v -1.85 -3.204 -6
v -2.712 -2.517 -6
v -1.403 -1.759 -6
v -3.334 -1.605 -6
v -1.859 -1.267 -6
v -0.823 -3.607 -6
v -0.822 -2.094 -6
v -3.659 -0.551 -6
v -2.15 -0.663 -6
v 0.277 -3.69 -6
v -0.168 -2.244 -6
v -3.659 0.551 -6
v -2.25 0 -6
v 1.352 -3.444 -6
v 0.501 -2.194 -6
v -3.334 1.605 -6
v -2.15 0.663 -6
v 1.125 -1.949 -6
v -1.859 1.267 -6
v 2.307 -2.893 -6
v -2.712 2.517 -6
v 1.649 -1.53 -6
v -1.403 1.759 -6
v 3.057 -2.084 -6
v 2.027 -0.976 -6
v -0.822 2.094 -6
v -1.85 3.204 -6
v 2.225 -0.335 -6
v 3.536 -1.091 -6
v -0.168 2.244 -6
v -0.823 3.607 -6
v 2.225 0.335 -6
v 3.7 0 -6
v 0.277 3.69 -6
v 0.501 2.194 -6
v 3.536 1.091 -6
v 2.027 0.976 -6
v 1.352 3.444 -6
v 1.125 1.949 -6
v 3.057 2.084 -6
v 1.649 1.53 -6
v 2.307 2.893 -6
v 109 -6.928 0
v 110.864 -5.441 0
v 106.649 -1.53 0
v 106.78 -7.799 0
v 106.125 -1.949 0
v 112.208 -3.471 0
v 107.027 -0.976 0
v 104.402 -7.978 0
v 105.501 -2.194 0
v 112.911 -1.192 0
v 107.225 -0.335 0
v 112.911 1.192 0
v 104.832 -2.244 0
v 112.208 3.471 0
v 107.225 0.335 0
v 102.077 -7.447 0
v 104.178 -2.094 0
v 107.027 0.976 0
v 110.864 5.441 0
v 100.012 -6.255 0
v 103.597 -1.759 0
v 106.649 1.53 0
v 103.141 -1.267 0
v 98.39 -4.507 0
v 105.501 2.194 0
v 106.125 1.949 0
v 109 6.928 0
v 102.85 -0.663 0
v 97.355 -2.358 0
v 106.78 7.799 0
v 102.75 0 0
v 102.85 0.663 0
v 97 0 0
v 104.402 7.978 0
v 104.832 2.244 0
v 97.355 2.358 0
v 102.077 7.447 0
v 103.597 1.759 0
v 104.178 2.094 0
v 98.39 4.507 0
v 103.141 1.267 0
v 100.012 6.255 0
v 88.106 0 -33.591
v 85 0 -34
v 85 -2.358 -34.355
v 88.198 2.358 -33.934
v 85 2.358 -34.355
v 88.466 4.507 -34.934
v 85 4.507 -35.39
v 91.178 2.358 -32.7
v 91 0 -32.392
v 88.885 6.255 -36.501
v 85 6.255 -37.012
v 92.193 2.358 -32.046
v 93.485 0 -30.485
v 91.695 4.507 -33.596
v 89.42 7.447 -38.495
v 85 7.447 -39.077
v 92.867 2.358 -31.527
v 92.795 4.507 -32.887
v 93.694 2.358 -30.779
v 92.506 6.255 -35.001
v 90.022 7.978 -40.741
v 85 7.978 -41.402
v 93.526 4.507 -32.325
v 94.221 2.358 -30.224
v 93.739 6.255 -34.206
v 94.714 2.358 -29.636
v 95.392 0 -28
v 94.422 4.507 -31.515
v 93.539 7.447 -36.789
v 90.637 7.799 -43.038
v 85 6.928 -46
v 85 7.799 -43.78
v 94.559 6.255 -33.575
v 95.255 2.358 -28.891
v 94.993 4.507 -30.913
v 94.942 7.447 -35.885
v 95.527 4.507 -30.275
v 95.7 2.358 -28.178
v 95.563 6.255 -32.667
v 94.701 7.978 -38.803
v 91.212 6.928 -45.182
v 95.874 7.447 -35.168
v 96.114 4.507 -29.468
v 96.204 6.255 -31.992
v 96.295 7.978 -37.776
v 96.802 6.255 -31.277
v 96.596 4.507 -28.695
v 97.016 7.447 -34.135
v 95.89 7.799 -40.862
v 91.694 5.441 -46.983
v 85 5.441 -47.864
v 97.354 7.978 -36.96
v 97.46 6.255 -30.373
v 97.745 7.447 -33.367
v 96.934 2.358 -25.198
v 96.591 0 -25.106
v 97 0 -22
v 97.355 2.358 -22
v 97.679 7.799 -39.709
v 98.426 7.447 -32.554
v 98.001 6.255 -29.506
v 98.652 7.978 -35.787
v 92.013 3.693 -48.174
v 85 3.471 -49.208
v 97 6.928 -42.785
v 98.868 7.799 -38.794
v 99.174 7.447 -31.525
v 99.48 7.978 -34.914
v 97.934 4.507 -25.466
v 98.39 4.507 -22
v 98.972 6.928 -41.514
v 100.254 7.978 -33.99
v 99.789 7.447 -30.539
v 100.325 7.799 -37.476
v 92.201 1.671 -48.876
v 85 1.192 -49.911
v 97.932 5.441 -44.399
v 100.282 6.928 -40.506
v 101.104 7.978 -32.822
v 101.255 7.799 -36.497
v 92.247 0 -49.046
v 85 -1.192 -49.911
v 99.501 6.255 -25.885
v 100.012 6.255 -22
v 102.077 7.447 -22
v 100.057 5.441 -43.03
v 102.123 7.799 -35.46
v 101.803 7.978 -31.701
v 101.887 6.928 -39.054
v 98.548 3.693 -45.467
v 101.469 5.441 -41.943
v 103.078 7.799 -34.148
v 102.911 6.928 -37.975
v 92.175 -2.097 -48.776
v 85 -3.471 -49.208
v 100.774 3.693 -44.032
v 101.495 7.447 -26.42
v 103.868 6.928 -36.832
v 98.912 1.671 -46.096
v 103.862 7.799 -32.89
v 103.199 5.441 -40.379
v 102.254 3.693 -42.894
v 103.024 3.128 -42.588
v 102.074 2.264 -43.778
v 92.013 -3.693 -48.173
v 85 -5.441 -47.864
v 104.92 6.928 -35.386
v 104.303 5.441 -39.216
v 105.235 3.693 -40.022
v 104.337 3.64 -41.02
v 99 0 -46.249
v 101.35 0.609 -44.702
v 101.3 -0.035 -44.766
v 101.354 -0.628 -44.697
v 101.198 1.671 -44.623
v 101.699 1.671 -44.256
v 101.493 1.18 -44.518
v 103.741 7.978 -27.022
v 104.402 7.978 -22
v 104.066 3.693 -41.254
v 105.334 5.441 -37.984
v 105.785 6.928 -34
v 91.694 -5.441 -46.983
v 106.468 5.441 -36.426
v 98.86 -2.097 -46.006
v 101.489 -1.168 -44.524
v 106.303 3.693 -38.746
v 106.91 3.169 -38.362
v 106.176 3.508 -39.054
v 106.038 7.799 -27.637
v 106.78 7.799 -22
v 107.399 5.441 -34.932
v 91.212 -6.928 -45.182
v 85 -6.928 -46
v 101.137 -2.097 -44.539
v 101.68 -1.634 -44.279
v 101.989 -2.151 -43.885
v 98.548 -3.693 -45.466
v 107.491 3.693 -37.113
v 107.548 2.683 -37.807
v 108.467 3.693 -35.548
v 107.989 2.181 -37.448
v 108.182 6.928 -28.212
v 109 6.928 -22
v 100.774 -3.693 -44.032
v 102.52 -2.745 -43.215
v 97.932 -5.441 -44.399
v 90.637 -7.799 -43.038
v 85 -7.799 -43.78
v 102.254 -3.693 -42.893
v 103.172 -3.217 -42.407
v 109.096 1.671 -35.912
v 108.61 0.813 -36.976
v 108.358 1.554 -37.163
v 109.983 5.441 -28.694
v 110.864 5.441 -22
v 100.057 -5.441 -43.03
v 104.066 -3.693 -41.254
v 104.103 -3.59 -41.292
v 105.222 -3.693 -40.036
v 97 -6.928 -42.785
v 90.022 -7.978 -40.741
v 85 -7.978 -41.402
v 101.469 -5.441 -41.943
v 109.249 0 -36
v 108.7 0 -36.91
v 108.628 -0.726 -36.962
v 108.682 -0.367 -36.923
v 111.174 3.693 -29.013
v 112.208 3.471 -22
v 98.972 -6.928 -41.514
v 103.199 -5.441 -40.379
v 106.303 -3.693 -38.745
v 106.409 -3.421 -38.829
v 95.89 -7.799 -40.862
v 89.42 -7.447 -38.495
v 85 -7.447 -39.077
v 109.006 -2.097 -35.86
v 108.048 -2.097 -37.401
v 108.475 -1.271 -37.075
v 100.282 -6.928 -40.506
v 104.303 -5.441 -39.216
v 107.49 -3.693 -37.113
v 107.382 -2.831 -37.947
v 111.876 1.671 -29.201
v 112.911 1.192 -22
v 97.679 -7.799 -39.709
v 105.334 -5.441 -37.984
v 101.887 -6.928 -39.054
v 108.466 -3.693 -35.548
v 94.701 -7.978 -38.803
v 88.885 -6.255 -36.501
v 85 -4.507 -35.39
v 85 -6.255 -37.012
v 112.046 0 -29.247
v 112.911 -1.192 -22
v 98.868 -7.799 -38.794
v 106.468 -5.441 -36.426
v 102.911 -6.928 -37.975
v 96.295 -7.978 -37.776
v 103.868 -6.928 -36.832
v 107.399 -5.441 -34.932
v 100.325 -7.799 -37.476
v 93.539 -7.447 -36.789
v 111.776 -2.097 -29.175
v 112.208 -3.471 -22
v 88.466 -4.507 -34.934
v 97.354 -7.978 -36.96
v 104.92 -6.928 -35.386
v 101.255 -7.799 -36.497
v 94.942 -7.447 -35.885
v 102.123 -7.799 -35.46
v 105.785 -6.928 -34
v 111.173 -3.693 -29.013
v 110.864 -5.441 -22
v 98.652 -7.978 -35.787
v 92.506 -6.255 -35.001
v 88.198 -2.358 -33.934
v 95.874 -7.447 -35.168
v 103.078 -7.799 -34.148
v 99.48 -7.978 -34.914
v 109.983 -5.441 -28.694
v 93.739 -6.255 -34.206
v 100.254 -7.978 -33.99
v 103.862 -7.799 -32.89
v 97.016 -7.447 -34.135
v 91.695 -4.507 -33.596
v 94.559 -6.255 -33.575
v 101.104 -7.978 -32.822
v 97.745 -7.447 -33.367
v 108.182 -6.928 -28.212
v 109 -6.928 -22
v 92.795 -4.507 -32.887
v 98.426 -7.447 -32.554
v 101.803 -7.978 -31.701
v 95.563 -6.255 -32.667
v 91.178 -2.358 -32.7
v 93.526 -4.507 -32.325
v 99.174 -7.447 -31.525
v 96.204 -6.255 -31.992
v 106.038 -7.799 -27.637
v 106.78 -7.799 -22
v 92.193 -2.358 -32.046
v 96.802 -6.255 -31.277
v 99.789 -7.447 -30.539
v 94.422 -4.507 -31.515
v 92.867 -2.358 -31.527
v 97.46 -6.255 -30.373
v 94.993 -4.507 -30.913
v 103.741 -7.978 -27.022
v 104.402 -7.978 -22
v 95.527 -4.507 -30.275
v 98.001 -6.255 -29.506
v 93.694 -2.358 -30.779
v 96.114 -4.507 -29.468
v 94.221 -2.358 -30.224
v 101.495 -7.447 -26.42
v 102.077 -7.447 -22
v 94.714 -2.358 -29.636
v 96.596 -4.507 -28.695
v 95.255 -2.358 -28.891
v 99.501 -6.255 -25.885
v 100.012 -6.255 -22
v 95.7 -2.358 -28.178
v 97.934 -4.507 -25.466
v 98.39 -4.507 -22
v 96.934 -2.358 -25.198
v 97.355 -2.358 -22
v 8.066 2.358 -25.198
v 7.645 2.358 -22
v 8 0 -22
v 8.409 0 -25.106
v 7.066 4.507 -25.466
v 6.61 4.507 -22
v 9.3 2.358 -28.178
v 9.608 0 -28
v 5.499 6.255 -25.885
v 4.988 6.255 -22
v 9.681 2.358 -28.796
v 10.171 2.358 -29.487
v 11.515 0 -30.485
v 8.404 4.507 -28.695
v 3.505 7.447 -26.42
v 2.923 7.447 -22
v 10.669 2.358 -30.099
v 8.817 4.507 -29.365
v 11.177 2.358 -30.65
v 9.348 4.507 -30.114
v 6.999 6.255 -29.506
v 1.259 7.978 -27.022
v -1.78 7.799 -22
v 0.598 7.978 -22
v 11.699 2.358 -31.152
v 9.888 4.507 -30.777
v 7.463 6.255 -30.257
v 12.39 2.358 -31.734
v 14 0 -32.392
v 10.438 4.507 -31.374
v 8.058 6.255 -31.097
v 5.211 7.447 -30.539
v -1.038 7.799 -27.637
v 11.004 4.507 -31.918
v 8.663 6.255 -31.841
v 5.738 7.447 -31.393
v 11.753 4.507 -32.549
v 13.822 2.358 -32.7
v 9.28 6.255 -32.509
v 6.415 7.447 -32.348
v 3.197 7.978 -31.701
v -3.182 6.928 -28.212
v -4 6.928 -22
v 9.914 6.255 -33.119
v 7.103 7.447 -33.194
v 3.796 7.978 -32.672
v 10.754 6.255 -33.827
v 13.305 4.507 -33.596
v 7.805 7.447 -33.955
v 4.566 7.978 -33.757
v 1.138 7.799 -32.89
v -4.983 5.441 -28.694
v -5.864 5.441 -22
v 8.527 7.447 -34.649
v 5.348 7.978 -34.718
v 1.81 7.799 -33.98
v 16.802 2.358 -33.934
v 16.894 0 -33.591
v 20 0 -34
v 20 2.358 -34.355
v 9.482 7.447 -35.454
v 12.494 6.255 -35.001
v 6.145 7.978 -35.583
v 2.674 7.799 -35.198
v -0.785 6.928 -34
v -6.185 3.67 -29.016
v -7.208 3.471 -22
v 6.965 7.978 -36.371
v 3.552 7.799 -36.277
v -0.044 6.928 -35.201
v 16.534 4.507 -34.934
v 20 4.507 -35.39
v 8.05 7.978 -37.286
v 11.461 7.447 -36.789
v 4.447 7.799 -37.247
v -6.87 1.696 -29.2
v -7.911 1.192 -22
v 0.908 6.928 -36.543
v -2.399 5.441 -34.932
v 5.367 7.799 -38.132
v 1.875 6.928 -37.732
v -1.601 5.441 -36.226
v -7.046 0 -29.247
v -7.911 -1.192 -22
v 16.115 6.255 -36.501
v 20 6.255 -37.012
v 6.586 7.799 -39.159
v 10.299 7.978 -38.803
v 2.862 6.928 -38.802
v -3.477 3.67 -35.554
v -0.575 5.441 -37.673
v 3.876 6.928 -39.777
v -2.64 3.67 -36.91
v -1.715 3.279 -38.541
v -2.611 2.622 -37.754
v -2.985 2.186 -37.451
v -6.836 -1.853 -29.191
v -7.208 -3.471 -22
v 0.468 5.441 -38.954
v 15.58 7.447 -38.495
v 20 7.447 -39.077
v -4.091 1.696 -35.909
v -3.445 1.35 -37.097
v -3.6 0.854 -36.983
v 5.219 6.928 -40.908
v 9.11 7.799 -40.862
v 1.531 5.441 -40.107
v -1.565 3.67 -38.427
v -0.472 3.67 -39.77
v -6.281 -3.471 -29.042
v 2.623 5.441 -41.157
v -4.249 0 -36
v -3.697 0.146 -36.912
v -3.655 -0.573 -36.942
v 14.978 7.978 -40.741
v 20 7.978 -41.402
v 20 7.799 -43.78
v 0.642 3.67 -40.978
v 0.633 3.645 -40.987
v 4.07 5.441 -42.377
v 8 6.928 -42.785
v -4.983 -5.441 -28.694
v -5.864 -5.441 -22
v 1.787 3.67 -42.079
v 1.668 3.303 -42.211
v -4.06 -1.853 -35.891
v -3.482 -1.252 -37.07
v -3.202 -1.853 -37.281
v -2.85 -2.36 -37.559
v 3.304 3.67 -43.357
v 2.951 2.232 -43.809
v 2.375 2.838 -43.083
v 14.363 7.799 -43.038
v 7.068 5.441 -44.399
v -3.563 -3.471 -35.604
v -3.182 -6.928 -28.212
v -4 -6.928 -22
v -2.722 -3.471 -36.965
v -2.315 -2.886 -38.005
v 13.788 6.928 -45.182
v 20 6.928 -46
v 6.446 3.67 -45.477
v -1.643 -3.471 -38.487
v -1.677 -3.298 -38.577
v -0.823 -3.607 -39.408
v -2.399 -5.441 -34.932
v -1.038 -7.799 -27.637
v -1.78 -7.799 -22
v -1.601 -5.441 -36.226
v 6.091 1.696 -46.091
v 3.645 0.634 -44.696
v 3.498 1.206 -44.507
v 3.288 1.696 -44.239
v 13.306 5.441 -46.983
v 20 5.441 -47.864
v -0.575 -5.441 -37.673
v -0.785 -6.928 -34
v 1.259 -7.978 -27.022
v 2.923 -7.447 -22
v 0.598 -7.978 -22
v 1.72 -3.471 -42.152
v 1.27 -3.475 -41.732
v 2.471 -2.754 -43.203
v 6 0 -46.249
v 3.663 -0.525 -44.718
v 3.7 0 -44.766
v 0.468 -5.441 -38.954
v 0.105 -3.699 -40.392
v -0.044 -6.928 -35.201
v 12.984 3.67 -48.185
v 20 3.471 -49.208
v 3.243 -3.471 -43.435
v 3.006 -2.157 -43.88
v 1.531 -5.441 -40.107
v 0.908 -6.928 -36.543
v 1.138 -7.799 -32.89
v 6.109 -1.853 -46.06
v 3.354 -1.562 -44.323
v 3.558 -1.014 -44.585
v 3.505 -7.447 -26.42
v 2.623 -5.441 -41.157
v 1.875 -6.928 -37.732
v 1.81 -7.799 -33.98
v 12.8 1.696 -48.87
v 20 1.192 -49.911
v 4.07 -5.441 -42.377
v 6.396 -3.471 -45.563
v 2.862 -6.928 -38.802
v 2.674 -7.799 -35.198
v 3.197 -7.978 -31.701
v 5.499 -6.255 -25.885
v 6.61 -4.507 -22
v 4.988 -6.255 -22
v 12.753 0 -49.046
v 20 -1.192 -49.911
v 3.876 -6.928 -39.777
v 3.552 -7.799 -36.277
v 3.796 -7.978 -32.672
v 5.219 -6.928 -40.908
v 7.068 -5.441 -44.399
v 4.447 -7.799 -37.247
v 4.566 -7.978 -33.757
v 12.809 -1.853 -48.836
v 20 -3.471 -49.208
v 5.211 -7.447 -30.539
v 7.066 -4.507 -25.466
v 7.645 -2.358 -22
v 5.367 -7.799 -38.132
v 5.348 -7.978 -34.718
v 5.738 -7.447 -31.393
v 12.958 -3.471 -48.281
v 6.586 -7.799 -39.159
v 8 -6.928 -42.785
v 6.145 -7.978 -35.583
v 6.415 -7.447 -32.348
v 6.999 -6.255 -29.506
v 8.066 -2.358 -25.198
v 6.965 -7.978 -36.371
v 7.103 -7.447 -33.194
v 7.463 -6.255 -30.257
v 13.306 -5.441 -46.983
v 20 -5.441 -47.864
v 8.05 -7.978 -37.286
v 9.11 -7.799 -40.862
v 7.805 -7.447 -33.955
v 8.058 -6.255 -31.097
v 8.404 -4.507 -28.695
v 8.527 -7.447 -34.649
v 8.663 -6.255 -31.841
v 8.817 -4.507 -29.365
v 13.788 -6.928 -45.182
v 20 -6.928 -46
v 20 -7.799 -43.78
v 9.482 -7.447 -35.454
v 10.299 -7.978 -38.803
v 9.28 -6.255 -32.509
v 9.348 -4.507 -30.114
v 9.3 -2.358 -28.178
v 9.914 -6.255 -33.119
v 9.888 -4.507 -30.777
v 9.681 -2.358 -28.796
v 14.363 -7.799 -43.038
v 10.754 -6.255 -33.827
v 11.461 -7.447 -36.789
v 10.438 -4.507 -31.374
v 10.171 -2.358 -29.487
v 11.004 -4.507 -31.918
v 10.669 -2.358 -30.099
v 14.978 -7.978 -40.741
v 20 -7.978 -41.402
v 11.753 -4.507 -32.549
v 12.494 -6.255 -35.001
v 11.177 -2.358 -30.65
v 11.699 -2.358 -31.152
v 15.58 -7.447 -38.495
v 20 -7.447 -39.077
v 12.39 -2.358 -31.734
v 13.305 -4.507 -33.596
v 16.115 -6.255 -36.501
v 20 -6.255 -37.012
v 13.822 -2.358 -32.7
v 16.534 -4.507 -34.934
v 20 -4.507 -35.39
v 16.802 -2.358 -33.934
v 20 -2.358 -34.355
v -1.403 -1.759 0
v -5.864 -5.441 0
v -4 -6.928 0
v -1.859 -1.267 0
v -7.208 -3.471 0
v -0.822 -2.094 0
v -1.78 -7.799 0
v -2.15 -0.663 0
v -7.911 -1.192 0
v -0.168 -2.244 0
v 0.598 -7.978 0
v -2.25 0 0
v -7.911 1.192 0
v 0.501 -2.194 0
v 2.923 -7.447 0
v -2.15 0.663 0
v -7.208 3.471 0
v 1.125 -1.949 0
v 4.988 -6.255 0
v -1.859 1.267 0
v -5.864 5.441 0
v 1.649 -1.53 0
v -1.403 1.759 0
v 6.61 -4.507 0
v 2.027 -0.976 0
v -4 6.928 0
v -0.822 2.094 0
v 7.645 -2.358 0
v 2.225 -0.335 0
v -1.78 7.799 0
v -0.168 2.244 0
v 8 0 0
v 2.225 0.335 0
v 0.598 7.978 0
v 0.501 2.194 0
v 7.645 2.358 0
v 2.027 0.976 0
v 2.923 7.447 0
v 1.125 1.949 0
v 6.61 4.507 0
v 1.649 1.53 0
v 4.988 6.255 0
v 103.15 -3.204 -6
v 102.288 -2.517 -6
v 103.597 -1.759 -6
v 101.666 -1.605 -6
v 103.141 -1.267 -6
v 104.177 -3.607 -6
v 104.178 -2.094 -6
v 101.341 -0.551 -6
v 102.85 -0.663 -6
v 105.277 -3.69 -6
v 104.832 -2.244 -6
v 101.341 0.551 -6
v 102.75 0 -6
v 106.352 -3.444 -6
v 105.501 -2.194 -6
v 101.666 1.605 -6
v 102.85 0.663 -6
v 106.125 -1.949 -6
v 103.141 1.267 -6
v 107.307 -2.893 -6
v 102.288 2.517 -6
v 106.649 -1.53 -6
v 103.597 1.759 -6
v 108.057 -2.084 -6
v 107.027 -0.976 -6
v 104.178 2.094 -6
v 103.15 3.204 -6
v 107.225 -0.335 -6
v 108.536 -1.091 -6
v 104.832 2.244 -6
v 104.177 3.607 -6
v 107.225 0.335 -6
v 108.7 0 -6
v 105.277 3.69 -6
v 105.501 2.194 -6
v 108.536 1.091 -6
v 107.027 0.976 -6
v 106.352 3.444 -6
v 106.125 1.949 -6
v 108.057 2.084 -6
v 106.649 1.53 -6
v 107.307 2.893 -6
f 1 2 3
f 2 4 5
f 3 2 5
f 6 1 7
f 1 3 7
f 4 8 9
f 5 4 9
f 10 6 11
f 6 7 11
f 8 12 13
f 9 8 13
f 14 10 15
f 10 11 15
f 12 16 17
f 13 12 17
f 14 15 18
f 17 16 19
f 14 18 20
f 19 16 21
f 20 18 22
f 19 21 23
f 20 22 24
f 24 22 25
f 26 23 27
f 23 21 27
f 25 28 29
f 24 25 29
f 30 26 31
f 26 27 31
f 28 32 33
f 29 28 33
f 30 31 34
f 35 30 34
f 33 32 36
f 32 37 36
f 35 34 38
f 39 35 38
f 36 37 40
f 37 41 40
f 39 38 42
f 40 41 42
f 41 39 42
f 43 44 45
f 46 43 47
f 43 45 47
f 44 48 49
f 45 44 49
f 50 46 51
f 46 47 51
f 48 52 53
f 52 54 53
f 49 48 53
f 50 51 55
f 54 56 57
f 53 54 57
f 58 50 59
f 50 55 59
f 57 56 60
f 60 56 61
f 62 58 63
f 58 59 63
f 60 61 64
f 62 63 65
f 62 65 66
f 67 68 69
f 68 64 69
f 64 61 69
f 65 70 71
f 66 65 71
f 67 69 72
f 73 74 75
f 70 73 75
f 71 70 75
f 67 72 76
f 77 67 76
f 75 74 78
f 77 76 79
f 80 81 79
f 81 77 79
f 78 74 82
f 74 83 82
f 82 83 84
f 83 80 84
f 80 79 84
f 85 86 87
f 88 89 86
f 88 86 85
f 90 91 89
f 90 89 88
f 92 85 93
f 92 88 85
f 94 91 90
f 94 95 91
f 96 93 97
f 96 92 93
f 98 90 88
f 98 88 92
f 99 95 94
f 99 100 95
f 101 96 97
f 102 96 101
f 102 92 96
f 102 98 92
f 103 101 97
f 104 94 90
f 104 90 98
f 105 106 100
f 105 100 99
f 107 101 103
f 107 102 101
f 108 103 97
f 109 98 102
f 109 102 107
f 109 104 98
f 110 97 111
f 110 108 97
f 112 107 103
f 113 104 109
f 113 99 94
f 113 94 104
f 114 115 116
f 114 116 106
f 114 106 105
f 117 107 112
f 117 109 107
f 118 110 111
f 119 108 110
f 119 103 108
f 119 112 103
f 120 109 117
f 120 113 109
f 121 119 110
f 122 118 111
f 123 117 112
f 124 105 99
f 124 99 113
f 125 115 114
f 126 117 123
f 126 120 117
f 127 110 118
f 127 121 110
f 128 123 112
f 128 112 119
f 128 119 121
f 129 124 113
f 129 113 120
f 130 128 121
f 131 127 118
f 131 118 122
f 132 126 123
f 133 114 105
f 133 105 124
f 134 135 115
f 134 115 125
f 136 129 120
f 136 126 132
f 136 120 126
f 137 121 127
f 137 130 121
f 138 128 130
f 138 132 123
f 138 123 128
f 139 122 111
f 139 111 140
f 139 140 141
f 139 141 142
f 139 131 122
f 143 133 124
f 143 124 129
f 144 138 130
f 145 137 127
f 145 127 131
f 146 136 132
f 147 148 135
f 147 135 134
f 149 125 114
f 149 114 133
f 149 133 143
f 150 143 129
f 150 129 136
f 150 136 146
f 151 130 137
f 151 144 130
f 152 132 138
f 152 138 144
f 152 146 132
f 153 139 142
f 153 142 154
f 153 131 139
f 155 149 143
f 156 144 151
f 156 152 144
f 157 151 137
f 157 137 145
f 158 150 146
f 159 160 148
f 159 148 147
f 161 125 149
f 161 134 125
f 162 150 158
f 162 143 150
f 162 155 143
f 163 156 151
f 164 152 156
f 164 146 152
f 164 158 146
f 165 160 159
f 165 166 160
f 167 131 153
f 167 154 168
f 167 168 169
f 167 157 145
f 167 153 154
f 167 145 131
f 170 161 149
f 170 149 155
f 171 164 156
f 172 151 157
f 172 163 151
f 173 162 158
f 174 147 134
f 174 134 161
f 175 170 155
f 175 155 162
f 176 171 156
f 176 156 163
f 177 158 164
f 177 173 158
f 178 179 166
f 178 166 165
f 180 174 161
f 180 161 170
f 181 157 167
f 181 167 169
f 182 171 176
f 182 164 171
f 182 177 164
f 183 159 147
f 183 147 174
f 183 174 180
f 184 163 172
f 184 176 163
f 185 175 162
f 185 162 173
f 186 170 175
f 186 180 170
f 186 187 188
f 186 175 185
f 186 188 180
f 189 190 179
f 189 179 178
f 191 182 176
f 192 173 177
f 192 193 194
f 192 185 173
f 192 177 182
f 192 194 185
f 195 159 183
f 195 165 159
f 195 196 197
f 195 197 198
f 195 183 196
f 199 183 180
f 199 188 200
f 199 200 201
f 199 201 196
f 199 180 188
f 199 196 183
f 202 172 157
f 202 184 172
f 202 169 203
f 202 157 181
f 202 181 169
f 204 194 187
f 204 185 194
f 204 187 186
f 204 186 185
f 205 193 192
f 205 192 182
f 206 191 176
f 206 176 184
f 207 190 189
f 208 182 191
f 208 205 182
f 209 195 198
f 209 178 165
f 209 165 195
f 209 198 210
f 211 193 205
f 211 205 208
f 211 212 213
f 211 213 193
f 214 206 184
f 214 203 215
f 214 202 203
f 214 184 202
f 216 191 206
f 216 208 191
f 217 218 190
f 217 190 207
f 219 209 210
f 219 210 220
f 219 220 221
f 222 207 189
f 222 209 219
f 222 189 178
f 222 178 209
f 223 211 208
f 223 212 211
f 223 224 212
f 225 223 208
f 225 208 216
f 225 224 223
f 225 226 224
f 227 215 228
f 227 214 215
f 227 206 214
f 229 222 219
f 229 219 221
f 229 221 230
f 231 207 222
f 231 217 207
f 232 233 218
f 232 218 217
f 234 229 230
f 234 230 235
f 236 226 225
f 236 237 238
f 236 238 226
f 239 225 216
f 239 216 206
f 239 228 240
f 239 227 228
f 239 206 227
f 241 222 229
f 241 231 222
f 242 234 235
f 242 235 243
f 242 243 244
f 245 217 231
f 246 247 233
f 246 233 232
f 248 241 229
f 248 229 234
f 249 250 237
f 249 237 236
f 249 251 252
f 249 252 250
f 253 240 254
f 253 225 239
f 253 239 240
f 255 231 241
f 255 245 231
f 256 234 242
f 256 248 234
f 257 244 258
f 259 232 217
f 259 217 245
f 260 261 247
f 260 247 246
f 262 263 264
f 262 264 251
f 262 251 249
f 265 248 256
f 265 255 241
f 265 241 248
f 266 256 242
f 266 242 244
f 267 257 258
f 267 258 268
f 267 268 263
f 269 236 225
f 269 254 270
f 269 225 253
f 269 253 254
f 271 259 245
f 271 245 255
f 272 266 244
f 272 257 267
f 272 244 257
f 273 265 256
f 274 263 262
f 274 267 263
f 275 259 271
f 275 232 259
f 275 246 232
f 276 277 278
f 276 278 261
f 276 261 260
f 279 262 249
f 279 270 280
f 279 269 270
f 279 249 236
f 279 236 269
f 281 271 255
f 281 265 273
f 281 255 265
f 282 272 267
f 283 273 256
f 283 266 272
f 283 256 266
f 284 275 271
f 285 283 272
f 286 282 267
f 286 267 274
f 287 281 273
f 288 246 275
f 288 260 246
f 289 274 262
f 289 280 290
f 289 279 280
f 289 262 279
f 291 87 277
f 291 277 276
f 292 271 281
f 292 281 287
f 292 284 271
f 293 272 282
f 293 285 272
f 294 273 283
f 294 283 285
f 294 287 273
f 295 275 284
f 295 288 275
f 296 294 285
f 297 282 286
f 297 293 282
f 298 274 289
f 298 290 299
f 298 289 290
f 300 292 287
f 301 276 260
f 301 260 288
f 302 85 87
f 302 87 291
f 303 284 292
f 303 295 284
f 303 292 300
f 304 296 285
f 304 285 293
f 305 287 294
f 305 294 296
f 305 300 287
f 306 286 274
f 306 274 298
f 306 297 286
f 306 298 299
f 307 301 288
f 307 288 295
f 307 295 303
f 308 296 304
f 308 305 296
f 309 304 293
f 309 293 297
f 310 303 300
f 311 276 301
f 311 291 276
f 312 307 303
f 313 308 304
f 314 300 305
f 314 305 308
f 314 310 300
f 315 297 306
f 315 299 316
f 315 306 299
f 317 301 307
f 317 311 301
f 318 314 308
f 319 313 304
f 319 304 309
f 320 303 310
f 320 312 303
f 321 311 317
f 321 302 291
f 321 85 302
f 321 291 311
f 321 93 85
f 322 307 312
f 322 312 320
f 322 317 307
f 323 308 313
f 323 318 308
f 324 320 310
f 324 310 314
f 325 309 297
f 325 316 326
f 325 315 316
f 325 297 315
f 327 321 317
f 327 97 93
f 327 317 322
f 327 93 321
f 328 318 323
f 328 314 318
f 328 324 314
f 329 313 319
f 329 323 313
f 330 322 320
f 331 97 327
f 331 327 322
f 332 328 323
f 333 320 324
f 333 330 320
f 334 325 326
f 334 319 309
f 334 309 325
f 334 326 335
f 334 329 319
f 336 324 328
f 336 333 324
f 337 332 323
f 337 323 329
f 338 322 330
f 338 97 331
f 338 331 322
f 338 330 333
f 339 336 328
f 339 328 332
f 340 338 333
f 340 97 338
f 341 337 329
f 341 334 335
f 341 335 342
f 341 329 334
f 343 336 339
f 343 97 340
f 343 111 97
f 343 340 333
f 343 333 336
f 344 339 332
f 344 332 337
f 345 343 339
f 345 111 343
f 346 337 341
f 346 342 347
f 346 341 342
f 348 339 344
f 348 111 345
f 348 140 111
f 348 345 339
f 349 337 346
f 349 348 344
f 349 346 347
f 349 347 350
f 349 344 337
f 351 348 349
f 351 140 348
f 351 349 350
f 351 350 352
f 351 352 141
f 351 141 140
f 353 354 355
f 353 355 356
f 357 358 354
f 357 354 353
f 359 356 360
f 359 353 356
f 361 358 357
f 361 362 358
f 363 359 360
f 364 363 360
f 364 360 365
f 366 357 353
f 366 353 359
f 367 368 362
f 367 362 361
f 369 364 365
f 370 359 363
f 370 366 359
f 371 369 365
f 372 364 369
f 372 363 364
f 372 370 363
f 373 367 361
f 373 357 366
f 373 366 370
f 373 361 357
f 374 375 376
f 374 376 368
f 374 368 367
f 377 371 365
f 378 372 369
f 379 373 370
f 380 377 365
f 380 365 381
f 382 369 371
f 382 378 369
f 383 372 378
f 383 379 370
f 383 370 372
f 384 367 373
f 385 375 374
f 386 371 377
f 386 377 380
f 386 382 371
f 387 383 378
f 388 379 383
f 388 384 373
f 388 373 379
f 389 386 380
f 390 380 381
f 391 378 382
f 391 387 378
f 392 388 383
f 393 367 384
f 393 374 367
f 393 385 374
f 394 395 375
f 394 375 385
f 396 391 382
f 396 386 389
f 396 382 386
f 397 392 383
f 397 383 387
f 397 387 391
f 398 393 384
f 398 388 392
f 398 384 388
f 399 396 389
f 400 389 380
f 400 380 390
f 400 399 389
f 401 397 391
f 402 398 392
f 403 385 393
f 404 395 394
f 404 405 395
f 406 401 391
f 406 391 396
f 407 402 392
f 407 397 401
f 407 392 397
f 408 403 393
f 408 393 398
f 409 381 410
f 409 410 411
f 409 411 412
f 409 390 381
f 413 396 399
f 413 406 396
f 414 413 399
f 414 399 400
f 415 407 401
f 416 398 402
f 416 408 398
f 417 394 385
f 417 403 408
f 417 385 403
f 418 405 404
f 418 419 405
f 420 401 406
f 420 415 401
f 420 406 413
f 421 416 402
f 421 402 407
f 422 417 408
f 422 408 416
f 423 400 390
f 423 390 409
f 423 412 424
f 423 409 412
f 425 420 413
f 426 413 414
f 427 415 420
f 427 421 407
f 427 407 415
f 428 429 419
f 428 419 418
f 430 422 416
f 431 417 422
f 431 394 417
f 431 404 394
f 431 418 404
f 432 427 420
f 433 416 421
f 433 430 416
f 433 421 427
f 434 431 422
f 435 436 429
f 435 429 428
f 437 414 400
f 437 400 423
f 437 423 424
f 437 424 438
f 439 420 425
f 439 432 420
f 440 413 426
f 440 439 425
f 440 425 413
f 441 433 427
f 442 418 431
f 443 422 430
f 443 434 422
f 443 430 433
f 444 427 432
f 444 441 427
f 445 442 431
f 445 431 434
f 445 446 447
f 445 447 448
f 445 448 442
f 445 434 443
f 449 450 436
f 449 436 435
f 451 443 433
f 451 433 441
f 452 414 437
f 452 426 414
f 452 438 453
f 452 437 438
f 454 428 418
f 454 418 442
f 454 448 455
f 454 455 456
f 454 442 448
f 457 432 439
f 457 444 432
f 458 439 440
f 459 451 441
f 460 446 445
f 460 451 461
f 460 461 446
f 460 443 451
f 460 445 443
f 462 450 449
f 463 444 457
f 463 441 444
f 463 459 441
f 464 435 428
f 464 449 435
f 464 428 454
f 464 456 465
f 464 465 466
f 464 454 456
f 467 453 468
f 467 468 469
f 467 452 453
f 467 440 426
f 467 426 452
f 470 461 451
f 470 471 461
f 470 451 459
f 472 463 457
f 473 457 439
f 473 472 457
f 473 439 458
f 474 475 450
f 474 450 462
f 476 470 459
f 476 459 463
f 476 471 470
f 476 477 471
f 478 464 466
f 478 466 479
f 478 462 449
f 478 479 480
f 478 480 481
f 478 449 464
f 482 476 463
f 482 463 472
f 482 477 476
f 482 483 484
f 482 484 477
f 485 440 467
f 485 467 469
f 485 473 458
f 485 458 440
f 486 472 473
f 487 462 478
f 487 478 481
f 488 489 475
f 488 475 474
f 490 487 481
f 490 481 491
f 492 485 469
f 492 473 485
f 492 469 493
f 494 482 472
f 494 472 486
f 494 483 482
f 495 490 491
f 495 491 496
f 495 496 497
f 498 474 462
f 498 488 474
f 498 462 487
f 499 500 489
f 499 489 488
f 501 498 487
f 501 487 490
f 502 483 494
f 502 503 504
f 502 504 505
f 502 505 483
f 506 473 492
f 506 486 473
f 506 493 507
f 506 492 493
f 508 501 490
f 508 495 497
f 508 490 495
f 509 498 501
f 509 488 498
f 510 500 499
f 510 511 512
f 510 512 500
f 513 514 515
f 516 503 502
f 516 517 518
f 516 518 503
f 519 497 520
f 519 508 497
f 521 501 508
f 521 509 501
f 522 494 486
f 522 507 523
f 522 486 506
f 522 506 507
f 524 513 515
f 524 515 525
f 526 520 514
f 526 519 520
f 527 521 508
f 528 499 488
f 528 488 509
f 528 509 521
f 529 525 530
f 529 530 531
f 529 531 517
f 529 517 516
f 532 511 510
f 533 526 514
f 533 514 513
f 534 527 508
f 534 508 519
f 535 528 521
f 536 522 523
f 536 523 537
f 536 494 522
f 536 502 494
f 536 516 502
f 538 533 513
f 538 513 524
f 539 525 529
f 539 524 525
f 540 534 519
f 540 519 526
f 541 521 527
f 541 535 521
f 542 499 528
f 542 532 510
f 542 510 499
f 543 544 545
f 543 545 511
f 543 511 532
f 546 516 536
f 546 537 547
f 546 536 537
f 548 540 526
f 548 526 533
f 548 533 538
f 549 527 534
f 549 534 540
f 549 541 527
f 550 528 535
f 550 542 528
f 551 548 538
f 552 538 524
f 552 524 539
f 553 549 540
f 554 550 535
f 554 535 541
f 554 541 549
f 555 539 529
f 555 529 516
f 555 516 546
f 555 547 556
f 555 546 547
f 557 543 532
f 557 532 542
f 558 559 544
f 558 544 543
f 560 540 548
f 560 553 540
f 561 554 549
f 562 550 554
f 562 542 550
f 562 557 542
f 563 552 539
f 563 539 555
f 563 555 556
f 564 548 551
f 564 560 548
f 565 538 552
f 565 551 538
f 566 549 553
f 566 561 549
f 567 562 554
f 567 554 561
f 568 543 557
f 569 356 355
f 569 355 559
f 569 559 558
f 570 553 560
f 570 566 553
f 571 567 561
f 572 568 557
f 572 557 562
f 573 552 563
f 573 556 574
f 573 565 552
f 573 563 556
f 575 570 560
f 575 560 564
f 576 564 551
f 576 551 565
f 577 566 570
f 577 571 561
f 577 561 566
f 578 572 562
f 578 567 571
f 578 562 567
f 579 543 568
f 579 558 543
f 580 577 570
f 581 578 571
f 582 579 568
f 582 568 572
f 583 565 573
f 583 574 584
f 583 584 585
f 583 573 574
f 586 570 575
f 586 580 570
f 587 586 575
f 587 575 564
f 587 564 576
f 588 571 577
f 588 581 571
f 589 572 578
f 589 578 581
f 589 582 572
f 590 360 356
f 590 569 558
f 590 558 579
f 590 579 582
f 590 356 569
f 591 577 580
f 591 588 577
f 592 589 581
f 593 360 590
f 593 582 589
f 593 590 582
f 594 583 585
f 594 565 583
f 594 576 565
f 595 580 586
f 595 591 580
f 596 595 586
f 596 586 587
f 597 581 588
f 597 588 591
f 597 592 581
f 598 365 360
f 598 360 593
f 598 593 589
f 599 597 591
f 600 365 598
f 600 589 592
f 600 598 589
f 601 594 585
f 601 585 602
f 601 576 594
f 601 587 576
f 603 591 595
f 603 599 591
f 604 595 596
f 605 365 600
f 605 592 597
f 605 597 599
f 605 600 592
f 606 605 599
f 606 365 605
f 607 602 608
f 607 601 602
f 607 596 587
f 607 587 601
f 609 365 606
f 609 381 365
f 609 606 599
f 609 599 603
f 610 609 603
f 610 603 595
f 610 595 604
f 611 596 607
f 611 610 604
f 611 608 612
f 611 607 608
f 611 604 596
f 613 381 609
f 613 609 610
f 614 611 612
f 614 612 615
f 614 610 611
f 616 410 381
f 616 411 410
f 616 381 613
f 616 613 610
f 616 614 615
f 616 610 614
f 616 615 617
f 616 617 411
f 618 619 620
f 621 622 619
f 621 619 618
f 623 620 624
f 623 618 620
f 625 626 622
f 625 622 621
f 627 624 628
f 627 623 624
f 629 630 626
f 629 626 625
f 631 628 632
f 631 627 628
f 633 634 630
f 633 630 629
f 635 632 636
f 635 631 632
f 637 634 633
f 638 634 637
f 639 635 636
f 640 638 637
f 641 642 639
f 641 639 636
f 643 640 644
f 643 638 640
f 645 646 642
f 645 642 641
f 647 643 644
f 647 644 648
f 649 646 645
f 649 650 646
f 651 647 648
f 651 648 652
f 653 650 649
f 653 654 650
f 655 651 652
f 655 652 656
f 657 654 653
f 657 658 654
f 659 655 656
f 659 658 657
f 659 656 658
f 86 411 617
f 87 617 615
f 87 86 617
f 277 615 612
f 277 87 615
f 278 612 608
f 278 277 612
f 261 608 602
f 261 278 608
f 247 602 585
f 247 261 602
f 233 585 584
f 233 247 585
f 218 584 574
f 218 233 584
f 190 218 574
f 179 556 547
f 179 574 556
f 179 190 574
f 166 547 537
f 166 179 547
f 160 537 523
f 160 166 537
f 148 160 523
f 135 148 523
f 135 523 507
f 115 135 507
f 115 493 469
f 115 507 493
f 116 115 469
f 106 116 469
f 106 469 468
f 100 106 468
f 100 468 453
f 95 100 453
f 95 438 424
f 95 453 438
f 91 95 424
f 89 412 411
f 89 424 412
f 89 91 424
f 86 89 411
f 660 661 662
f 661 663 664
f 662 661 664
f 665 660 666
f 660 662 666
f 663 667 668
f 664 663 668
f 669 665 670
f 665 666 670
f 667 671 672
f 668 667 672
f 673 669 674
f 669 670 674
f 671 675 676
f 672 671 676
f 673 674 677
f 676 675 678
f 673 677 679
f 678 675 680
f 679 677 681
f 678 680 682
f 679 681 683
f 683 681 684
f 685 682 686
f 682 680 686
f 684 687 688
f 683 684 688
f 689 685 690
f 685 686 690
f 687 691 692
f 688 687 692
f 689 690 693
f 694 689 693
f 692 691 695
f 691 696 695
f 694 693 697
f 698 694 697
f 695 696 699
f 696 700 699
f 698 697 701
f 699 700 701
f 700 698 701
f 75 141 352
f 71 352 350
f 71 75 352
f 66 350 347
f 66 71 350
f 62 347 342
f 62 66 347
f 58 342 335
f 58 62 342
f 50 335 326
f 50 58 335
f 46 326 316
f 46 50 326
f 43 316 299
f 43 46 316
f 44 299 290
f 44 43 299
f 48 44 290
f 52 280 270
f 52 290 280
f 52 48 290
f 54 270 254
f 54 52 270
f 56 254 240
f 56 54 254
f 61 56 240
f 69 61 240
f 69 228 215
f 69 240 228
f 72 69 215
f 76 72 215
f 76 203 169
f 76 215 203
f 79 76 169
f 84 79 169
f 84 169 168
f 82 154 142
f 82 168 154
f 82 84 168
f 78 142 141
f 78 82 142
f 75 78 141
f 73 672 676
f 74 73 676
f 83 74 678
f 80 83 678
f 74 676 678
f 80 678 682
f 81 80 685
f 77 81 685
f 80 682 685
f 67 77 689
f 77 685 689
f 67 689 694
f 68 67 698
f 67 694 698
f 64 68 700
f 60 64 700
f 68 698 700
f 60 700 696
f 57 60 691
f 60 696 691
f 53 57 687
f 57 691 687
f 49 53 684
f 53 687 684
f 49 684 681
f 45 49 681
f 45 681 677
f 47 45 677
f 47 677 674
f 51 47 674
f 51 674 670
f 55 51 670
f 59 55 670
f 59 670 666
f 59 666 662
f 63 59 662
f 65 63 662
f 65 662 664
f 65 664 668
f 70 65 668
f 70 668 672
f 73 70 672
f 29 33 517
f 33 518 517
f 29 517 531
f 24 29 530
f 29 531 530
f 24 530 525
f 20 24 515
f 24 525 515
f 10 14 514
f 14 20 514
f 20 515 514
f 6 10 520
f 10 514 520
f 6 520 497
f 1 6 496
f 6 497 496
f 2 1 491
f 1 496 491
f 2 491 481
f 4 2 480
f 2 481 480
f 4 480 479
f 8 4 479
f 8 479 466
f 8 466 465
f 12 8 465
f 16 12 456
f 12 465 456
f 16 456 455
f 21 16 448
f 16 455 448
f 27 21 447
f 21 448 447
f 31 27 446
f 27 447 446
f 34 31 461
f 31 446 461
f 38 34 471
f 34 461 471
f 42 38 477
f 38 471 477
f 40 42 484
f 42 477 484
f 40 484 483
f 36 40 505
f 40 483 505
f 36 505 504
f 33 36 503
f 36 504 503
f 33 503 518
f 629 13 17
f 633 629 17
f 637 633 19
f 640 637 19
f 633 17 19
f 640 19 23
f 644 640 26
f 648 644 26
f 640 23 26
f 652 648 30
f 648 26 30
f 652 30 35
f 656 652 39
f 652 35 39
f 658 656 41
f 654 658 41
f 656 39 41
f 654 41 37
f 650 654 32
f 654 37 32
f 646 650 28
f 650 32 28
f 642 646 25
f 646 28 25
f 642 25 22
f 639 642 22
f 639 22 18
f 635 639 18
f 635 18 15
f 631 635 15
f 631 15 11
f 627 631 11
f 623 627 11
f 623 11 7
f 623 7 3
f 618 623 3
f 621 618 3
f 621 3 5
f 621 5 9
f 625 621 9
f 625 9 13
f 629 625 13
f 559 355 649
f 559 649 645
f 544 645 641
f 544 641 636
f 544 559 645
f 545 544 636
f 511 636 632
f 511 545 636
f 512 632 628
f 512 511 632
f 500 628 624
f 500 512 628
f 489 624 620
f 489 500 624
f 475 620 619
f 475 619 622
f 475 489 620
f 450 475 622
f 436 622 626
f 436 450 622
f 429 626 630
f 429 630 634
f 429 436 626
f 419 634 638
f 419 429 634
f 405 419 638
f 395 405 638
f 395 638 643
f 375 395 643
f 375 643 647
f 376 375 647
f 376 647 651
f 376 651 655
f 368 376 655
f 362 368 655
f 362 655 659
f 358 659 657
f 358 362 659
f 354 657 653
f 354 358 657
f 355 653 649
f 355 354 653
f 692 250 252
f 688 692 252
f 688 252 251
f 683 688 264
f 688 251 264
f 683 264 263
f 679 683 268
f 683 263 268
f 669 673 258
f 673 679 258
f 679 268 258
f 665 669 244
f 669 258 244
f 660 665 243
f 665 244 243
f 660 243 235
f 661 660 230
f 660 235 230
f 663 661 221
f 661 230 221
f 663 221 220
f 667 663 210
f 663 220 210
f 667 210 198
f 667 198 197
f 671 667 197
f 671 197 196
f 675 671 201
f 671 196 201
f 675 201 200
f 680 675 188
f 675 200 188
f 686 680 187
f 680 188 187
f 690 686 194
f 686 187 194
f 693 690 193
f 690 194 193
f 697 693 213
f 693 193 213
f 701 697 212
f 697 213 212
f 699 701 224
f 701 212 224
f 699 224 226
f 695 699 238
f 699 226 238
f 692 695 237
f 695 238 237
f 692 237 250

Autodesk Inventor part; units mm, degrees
ref_plane "YZ Plane" through (0, 0, 0) normal (1, 0, 0) x (0, 1, 0)
ref_plane "XZ Plane" through (0, 0, 0) normal (0, 1, 0) x (-1, 0, 0)
sketch "Sketch1" plane through (0, 0, 0) normal (0, 0, 1) x (1, 0, 0)
  circle A0 centre (0, 0) radius 8
  dimension "d0" = 16
sketch "Sketch2" plane through (0, 0, 0) normal (0, 1, 0) x (-1, 0, 0)
  line L0 (0, 0) -> (0, -22)
  line L1 (-20, -42) -> (-85, -42)
  line L2 (-105, -22) -> (-105, 0)
  arc A0 (-20, -42) -> (0, -22) centre (-20, -22) ccw
  arc A1 (-105, -22) -> (-85, -42) centre (-85, -22) ccw
  point P0 (0, -42)
  point P1 (-105, -42)
  dimension "d1" = 105
  dimension "d2" = 42
  dimension "d3" = 20
sweep "Sweep1" add profiles "Sketch1" path "Sketch2"
ref_plane "Work Plane1" through (0, 0, -55) normal (0, 0, 1) x (1, 0, 0)
sketch "Sketch3" plane through (0, 0, -55) normal (0, 0, 1) x (1, 0, 0)
  circle A0 centre (0, 0) radius 3.7
  circle A1 centre (105, 0) radius 8 projected
  circle A2 centre (105, 0) radius 3.7
  dimension "d7" = 7.4
  dimension "d8" = 7.4
extrude "Extrusion1" cut sketch "Sketch3" along normal blind 49 contours A0 | A2
sketch "Sketch4" plane through (0, 0, -6) normal (0, 0, -1) x (-1, 0, 0)
  circle A0 centre (0, 0) radius 3.7 projected
  circle A1 centre (-105, 0) radius 3.7 projected
  circle A2 centre (0, 0) radius 2.25
  circle A3 centre (-105, 0) radius 2.25
  dimension "d11" = 4.5
  dimension "d12" = 4.5
extrude "Extrusion2" cut sketch "Sketch4" against normal up to surface (6 mm away) contours A2 | A3
properties part number "FrameHandle" material "ABS Plastic"
